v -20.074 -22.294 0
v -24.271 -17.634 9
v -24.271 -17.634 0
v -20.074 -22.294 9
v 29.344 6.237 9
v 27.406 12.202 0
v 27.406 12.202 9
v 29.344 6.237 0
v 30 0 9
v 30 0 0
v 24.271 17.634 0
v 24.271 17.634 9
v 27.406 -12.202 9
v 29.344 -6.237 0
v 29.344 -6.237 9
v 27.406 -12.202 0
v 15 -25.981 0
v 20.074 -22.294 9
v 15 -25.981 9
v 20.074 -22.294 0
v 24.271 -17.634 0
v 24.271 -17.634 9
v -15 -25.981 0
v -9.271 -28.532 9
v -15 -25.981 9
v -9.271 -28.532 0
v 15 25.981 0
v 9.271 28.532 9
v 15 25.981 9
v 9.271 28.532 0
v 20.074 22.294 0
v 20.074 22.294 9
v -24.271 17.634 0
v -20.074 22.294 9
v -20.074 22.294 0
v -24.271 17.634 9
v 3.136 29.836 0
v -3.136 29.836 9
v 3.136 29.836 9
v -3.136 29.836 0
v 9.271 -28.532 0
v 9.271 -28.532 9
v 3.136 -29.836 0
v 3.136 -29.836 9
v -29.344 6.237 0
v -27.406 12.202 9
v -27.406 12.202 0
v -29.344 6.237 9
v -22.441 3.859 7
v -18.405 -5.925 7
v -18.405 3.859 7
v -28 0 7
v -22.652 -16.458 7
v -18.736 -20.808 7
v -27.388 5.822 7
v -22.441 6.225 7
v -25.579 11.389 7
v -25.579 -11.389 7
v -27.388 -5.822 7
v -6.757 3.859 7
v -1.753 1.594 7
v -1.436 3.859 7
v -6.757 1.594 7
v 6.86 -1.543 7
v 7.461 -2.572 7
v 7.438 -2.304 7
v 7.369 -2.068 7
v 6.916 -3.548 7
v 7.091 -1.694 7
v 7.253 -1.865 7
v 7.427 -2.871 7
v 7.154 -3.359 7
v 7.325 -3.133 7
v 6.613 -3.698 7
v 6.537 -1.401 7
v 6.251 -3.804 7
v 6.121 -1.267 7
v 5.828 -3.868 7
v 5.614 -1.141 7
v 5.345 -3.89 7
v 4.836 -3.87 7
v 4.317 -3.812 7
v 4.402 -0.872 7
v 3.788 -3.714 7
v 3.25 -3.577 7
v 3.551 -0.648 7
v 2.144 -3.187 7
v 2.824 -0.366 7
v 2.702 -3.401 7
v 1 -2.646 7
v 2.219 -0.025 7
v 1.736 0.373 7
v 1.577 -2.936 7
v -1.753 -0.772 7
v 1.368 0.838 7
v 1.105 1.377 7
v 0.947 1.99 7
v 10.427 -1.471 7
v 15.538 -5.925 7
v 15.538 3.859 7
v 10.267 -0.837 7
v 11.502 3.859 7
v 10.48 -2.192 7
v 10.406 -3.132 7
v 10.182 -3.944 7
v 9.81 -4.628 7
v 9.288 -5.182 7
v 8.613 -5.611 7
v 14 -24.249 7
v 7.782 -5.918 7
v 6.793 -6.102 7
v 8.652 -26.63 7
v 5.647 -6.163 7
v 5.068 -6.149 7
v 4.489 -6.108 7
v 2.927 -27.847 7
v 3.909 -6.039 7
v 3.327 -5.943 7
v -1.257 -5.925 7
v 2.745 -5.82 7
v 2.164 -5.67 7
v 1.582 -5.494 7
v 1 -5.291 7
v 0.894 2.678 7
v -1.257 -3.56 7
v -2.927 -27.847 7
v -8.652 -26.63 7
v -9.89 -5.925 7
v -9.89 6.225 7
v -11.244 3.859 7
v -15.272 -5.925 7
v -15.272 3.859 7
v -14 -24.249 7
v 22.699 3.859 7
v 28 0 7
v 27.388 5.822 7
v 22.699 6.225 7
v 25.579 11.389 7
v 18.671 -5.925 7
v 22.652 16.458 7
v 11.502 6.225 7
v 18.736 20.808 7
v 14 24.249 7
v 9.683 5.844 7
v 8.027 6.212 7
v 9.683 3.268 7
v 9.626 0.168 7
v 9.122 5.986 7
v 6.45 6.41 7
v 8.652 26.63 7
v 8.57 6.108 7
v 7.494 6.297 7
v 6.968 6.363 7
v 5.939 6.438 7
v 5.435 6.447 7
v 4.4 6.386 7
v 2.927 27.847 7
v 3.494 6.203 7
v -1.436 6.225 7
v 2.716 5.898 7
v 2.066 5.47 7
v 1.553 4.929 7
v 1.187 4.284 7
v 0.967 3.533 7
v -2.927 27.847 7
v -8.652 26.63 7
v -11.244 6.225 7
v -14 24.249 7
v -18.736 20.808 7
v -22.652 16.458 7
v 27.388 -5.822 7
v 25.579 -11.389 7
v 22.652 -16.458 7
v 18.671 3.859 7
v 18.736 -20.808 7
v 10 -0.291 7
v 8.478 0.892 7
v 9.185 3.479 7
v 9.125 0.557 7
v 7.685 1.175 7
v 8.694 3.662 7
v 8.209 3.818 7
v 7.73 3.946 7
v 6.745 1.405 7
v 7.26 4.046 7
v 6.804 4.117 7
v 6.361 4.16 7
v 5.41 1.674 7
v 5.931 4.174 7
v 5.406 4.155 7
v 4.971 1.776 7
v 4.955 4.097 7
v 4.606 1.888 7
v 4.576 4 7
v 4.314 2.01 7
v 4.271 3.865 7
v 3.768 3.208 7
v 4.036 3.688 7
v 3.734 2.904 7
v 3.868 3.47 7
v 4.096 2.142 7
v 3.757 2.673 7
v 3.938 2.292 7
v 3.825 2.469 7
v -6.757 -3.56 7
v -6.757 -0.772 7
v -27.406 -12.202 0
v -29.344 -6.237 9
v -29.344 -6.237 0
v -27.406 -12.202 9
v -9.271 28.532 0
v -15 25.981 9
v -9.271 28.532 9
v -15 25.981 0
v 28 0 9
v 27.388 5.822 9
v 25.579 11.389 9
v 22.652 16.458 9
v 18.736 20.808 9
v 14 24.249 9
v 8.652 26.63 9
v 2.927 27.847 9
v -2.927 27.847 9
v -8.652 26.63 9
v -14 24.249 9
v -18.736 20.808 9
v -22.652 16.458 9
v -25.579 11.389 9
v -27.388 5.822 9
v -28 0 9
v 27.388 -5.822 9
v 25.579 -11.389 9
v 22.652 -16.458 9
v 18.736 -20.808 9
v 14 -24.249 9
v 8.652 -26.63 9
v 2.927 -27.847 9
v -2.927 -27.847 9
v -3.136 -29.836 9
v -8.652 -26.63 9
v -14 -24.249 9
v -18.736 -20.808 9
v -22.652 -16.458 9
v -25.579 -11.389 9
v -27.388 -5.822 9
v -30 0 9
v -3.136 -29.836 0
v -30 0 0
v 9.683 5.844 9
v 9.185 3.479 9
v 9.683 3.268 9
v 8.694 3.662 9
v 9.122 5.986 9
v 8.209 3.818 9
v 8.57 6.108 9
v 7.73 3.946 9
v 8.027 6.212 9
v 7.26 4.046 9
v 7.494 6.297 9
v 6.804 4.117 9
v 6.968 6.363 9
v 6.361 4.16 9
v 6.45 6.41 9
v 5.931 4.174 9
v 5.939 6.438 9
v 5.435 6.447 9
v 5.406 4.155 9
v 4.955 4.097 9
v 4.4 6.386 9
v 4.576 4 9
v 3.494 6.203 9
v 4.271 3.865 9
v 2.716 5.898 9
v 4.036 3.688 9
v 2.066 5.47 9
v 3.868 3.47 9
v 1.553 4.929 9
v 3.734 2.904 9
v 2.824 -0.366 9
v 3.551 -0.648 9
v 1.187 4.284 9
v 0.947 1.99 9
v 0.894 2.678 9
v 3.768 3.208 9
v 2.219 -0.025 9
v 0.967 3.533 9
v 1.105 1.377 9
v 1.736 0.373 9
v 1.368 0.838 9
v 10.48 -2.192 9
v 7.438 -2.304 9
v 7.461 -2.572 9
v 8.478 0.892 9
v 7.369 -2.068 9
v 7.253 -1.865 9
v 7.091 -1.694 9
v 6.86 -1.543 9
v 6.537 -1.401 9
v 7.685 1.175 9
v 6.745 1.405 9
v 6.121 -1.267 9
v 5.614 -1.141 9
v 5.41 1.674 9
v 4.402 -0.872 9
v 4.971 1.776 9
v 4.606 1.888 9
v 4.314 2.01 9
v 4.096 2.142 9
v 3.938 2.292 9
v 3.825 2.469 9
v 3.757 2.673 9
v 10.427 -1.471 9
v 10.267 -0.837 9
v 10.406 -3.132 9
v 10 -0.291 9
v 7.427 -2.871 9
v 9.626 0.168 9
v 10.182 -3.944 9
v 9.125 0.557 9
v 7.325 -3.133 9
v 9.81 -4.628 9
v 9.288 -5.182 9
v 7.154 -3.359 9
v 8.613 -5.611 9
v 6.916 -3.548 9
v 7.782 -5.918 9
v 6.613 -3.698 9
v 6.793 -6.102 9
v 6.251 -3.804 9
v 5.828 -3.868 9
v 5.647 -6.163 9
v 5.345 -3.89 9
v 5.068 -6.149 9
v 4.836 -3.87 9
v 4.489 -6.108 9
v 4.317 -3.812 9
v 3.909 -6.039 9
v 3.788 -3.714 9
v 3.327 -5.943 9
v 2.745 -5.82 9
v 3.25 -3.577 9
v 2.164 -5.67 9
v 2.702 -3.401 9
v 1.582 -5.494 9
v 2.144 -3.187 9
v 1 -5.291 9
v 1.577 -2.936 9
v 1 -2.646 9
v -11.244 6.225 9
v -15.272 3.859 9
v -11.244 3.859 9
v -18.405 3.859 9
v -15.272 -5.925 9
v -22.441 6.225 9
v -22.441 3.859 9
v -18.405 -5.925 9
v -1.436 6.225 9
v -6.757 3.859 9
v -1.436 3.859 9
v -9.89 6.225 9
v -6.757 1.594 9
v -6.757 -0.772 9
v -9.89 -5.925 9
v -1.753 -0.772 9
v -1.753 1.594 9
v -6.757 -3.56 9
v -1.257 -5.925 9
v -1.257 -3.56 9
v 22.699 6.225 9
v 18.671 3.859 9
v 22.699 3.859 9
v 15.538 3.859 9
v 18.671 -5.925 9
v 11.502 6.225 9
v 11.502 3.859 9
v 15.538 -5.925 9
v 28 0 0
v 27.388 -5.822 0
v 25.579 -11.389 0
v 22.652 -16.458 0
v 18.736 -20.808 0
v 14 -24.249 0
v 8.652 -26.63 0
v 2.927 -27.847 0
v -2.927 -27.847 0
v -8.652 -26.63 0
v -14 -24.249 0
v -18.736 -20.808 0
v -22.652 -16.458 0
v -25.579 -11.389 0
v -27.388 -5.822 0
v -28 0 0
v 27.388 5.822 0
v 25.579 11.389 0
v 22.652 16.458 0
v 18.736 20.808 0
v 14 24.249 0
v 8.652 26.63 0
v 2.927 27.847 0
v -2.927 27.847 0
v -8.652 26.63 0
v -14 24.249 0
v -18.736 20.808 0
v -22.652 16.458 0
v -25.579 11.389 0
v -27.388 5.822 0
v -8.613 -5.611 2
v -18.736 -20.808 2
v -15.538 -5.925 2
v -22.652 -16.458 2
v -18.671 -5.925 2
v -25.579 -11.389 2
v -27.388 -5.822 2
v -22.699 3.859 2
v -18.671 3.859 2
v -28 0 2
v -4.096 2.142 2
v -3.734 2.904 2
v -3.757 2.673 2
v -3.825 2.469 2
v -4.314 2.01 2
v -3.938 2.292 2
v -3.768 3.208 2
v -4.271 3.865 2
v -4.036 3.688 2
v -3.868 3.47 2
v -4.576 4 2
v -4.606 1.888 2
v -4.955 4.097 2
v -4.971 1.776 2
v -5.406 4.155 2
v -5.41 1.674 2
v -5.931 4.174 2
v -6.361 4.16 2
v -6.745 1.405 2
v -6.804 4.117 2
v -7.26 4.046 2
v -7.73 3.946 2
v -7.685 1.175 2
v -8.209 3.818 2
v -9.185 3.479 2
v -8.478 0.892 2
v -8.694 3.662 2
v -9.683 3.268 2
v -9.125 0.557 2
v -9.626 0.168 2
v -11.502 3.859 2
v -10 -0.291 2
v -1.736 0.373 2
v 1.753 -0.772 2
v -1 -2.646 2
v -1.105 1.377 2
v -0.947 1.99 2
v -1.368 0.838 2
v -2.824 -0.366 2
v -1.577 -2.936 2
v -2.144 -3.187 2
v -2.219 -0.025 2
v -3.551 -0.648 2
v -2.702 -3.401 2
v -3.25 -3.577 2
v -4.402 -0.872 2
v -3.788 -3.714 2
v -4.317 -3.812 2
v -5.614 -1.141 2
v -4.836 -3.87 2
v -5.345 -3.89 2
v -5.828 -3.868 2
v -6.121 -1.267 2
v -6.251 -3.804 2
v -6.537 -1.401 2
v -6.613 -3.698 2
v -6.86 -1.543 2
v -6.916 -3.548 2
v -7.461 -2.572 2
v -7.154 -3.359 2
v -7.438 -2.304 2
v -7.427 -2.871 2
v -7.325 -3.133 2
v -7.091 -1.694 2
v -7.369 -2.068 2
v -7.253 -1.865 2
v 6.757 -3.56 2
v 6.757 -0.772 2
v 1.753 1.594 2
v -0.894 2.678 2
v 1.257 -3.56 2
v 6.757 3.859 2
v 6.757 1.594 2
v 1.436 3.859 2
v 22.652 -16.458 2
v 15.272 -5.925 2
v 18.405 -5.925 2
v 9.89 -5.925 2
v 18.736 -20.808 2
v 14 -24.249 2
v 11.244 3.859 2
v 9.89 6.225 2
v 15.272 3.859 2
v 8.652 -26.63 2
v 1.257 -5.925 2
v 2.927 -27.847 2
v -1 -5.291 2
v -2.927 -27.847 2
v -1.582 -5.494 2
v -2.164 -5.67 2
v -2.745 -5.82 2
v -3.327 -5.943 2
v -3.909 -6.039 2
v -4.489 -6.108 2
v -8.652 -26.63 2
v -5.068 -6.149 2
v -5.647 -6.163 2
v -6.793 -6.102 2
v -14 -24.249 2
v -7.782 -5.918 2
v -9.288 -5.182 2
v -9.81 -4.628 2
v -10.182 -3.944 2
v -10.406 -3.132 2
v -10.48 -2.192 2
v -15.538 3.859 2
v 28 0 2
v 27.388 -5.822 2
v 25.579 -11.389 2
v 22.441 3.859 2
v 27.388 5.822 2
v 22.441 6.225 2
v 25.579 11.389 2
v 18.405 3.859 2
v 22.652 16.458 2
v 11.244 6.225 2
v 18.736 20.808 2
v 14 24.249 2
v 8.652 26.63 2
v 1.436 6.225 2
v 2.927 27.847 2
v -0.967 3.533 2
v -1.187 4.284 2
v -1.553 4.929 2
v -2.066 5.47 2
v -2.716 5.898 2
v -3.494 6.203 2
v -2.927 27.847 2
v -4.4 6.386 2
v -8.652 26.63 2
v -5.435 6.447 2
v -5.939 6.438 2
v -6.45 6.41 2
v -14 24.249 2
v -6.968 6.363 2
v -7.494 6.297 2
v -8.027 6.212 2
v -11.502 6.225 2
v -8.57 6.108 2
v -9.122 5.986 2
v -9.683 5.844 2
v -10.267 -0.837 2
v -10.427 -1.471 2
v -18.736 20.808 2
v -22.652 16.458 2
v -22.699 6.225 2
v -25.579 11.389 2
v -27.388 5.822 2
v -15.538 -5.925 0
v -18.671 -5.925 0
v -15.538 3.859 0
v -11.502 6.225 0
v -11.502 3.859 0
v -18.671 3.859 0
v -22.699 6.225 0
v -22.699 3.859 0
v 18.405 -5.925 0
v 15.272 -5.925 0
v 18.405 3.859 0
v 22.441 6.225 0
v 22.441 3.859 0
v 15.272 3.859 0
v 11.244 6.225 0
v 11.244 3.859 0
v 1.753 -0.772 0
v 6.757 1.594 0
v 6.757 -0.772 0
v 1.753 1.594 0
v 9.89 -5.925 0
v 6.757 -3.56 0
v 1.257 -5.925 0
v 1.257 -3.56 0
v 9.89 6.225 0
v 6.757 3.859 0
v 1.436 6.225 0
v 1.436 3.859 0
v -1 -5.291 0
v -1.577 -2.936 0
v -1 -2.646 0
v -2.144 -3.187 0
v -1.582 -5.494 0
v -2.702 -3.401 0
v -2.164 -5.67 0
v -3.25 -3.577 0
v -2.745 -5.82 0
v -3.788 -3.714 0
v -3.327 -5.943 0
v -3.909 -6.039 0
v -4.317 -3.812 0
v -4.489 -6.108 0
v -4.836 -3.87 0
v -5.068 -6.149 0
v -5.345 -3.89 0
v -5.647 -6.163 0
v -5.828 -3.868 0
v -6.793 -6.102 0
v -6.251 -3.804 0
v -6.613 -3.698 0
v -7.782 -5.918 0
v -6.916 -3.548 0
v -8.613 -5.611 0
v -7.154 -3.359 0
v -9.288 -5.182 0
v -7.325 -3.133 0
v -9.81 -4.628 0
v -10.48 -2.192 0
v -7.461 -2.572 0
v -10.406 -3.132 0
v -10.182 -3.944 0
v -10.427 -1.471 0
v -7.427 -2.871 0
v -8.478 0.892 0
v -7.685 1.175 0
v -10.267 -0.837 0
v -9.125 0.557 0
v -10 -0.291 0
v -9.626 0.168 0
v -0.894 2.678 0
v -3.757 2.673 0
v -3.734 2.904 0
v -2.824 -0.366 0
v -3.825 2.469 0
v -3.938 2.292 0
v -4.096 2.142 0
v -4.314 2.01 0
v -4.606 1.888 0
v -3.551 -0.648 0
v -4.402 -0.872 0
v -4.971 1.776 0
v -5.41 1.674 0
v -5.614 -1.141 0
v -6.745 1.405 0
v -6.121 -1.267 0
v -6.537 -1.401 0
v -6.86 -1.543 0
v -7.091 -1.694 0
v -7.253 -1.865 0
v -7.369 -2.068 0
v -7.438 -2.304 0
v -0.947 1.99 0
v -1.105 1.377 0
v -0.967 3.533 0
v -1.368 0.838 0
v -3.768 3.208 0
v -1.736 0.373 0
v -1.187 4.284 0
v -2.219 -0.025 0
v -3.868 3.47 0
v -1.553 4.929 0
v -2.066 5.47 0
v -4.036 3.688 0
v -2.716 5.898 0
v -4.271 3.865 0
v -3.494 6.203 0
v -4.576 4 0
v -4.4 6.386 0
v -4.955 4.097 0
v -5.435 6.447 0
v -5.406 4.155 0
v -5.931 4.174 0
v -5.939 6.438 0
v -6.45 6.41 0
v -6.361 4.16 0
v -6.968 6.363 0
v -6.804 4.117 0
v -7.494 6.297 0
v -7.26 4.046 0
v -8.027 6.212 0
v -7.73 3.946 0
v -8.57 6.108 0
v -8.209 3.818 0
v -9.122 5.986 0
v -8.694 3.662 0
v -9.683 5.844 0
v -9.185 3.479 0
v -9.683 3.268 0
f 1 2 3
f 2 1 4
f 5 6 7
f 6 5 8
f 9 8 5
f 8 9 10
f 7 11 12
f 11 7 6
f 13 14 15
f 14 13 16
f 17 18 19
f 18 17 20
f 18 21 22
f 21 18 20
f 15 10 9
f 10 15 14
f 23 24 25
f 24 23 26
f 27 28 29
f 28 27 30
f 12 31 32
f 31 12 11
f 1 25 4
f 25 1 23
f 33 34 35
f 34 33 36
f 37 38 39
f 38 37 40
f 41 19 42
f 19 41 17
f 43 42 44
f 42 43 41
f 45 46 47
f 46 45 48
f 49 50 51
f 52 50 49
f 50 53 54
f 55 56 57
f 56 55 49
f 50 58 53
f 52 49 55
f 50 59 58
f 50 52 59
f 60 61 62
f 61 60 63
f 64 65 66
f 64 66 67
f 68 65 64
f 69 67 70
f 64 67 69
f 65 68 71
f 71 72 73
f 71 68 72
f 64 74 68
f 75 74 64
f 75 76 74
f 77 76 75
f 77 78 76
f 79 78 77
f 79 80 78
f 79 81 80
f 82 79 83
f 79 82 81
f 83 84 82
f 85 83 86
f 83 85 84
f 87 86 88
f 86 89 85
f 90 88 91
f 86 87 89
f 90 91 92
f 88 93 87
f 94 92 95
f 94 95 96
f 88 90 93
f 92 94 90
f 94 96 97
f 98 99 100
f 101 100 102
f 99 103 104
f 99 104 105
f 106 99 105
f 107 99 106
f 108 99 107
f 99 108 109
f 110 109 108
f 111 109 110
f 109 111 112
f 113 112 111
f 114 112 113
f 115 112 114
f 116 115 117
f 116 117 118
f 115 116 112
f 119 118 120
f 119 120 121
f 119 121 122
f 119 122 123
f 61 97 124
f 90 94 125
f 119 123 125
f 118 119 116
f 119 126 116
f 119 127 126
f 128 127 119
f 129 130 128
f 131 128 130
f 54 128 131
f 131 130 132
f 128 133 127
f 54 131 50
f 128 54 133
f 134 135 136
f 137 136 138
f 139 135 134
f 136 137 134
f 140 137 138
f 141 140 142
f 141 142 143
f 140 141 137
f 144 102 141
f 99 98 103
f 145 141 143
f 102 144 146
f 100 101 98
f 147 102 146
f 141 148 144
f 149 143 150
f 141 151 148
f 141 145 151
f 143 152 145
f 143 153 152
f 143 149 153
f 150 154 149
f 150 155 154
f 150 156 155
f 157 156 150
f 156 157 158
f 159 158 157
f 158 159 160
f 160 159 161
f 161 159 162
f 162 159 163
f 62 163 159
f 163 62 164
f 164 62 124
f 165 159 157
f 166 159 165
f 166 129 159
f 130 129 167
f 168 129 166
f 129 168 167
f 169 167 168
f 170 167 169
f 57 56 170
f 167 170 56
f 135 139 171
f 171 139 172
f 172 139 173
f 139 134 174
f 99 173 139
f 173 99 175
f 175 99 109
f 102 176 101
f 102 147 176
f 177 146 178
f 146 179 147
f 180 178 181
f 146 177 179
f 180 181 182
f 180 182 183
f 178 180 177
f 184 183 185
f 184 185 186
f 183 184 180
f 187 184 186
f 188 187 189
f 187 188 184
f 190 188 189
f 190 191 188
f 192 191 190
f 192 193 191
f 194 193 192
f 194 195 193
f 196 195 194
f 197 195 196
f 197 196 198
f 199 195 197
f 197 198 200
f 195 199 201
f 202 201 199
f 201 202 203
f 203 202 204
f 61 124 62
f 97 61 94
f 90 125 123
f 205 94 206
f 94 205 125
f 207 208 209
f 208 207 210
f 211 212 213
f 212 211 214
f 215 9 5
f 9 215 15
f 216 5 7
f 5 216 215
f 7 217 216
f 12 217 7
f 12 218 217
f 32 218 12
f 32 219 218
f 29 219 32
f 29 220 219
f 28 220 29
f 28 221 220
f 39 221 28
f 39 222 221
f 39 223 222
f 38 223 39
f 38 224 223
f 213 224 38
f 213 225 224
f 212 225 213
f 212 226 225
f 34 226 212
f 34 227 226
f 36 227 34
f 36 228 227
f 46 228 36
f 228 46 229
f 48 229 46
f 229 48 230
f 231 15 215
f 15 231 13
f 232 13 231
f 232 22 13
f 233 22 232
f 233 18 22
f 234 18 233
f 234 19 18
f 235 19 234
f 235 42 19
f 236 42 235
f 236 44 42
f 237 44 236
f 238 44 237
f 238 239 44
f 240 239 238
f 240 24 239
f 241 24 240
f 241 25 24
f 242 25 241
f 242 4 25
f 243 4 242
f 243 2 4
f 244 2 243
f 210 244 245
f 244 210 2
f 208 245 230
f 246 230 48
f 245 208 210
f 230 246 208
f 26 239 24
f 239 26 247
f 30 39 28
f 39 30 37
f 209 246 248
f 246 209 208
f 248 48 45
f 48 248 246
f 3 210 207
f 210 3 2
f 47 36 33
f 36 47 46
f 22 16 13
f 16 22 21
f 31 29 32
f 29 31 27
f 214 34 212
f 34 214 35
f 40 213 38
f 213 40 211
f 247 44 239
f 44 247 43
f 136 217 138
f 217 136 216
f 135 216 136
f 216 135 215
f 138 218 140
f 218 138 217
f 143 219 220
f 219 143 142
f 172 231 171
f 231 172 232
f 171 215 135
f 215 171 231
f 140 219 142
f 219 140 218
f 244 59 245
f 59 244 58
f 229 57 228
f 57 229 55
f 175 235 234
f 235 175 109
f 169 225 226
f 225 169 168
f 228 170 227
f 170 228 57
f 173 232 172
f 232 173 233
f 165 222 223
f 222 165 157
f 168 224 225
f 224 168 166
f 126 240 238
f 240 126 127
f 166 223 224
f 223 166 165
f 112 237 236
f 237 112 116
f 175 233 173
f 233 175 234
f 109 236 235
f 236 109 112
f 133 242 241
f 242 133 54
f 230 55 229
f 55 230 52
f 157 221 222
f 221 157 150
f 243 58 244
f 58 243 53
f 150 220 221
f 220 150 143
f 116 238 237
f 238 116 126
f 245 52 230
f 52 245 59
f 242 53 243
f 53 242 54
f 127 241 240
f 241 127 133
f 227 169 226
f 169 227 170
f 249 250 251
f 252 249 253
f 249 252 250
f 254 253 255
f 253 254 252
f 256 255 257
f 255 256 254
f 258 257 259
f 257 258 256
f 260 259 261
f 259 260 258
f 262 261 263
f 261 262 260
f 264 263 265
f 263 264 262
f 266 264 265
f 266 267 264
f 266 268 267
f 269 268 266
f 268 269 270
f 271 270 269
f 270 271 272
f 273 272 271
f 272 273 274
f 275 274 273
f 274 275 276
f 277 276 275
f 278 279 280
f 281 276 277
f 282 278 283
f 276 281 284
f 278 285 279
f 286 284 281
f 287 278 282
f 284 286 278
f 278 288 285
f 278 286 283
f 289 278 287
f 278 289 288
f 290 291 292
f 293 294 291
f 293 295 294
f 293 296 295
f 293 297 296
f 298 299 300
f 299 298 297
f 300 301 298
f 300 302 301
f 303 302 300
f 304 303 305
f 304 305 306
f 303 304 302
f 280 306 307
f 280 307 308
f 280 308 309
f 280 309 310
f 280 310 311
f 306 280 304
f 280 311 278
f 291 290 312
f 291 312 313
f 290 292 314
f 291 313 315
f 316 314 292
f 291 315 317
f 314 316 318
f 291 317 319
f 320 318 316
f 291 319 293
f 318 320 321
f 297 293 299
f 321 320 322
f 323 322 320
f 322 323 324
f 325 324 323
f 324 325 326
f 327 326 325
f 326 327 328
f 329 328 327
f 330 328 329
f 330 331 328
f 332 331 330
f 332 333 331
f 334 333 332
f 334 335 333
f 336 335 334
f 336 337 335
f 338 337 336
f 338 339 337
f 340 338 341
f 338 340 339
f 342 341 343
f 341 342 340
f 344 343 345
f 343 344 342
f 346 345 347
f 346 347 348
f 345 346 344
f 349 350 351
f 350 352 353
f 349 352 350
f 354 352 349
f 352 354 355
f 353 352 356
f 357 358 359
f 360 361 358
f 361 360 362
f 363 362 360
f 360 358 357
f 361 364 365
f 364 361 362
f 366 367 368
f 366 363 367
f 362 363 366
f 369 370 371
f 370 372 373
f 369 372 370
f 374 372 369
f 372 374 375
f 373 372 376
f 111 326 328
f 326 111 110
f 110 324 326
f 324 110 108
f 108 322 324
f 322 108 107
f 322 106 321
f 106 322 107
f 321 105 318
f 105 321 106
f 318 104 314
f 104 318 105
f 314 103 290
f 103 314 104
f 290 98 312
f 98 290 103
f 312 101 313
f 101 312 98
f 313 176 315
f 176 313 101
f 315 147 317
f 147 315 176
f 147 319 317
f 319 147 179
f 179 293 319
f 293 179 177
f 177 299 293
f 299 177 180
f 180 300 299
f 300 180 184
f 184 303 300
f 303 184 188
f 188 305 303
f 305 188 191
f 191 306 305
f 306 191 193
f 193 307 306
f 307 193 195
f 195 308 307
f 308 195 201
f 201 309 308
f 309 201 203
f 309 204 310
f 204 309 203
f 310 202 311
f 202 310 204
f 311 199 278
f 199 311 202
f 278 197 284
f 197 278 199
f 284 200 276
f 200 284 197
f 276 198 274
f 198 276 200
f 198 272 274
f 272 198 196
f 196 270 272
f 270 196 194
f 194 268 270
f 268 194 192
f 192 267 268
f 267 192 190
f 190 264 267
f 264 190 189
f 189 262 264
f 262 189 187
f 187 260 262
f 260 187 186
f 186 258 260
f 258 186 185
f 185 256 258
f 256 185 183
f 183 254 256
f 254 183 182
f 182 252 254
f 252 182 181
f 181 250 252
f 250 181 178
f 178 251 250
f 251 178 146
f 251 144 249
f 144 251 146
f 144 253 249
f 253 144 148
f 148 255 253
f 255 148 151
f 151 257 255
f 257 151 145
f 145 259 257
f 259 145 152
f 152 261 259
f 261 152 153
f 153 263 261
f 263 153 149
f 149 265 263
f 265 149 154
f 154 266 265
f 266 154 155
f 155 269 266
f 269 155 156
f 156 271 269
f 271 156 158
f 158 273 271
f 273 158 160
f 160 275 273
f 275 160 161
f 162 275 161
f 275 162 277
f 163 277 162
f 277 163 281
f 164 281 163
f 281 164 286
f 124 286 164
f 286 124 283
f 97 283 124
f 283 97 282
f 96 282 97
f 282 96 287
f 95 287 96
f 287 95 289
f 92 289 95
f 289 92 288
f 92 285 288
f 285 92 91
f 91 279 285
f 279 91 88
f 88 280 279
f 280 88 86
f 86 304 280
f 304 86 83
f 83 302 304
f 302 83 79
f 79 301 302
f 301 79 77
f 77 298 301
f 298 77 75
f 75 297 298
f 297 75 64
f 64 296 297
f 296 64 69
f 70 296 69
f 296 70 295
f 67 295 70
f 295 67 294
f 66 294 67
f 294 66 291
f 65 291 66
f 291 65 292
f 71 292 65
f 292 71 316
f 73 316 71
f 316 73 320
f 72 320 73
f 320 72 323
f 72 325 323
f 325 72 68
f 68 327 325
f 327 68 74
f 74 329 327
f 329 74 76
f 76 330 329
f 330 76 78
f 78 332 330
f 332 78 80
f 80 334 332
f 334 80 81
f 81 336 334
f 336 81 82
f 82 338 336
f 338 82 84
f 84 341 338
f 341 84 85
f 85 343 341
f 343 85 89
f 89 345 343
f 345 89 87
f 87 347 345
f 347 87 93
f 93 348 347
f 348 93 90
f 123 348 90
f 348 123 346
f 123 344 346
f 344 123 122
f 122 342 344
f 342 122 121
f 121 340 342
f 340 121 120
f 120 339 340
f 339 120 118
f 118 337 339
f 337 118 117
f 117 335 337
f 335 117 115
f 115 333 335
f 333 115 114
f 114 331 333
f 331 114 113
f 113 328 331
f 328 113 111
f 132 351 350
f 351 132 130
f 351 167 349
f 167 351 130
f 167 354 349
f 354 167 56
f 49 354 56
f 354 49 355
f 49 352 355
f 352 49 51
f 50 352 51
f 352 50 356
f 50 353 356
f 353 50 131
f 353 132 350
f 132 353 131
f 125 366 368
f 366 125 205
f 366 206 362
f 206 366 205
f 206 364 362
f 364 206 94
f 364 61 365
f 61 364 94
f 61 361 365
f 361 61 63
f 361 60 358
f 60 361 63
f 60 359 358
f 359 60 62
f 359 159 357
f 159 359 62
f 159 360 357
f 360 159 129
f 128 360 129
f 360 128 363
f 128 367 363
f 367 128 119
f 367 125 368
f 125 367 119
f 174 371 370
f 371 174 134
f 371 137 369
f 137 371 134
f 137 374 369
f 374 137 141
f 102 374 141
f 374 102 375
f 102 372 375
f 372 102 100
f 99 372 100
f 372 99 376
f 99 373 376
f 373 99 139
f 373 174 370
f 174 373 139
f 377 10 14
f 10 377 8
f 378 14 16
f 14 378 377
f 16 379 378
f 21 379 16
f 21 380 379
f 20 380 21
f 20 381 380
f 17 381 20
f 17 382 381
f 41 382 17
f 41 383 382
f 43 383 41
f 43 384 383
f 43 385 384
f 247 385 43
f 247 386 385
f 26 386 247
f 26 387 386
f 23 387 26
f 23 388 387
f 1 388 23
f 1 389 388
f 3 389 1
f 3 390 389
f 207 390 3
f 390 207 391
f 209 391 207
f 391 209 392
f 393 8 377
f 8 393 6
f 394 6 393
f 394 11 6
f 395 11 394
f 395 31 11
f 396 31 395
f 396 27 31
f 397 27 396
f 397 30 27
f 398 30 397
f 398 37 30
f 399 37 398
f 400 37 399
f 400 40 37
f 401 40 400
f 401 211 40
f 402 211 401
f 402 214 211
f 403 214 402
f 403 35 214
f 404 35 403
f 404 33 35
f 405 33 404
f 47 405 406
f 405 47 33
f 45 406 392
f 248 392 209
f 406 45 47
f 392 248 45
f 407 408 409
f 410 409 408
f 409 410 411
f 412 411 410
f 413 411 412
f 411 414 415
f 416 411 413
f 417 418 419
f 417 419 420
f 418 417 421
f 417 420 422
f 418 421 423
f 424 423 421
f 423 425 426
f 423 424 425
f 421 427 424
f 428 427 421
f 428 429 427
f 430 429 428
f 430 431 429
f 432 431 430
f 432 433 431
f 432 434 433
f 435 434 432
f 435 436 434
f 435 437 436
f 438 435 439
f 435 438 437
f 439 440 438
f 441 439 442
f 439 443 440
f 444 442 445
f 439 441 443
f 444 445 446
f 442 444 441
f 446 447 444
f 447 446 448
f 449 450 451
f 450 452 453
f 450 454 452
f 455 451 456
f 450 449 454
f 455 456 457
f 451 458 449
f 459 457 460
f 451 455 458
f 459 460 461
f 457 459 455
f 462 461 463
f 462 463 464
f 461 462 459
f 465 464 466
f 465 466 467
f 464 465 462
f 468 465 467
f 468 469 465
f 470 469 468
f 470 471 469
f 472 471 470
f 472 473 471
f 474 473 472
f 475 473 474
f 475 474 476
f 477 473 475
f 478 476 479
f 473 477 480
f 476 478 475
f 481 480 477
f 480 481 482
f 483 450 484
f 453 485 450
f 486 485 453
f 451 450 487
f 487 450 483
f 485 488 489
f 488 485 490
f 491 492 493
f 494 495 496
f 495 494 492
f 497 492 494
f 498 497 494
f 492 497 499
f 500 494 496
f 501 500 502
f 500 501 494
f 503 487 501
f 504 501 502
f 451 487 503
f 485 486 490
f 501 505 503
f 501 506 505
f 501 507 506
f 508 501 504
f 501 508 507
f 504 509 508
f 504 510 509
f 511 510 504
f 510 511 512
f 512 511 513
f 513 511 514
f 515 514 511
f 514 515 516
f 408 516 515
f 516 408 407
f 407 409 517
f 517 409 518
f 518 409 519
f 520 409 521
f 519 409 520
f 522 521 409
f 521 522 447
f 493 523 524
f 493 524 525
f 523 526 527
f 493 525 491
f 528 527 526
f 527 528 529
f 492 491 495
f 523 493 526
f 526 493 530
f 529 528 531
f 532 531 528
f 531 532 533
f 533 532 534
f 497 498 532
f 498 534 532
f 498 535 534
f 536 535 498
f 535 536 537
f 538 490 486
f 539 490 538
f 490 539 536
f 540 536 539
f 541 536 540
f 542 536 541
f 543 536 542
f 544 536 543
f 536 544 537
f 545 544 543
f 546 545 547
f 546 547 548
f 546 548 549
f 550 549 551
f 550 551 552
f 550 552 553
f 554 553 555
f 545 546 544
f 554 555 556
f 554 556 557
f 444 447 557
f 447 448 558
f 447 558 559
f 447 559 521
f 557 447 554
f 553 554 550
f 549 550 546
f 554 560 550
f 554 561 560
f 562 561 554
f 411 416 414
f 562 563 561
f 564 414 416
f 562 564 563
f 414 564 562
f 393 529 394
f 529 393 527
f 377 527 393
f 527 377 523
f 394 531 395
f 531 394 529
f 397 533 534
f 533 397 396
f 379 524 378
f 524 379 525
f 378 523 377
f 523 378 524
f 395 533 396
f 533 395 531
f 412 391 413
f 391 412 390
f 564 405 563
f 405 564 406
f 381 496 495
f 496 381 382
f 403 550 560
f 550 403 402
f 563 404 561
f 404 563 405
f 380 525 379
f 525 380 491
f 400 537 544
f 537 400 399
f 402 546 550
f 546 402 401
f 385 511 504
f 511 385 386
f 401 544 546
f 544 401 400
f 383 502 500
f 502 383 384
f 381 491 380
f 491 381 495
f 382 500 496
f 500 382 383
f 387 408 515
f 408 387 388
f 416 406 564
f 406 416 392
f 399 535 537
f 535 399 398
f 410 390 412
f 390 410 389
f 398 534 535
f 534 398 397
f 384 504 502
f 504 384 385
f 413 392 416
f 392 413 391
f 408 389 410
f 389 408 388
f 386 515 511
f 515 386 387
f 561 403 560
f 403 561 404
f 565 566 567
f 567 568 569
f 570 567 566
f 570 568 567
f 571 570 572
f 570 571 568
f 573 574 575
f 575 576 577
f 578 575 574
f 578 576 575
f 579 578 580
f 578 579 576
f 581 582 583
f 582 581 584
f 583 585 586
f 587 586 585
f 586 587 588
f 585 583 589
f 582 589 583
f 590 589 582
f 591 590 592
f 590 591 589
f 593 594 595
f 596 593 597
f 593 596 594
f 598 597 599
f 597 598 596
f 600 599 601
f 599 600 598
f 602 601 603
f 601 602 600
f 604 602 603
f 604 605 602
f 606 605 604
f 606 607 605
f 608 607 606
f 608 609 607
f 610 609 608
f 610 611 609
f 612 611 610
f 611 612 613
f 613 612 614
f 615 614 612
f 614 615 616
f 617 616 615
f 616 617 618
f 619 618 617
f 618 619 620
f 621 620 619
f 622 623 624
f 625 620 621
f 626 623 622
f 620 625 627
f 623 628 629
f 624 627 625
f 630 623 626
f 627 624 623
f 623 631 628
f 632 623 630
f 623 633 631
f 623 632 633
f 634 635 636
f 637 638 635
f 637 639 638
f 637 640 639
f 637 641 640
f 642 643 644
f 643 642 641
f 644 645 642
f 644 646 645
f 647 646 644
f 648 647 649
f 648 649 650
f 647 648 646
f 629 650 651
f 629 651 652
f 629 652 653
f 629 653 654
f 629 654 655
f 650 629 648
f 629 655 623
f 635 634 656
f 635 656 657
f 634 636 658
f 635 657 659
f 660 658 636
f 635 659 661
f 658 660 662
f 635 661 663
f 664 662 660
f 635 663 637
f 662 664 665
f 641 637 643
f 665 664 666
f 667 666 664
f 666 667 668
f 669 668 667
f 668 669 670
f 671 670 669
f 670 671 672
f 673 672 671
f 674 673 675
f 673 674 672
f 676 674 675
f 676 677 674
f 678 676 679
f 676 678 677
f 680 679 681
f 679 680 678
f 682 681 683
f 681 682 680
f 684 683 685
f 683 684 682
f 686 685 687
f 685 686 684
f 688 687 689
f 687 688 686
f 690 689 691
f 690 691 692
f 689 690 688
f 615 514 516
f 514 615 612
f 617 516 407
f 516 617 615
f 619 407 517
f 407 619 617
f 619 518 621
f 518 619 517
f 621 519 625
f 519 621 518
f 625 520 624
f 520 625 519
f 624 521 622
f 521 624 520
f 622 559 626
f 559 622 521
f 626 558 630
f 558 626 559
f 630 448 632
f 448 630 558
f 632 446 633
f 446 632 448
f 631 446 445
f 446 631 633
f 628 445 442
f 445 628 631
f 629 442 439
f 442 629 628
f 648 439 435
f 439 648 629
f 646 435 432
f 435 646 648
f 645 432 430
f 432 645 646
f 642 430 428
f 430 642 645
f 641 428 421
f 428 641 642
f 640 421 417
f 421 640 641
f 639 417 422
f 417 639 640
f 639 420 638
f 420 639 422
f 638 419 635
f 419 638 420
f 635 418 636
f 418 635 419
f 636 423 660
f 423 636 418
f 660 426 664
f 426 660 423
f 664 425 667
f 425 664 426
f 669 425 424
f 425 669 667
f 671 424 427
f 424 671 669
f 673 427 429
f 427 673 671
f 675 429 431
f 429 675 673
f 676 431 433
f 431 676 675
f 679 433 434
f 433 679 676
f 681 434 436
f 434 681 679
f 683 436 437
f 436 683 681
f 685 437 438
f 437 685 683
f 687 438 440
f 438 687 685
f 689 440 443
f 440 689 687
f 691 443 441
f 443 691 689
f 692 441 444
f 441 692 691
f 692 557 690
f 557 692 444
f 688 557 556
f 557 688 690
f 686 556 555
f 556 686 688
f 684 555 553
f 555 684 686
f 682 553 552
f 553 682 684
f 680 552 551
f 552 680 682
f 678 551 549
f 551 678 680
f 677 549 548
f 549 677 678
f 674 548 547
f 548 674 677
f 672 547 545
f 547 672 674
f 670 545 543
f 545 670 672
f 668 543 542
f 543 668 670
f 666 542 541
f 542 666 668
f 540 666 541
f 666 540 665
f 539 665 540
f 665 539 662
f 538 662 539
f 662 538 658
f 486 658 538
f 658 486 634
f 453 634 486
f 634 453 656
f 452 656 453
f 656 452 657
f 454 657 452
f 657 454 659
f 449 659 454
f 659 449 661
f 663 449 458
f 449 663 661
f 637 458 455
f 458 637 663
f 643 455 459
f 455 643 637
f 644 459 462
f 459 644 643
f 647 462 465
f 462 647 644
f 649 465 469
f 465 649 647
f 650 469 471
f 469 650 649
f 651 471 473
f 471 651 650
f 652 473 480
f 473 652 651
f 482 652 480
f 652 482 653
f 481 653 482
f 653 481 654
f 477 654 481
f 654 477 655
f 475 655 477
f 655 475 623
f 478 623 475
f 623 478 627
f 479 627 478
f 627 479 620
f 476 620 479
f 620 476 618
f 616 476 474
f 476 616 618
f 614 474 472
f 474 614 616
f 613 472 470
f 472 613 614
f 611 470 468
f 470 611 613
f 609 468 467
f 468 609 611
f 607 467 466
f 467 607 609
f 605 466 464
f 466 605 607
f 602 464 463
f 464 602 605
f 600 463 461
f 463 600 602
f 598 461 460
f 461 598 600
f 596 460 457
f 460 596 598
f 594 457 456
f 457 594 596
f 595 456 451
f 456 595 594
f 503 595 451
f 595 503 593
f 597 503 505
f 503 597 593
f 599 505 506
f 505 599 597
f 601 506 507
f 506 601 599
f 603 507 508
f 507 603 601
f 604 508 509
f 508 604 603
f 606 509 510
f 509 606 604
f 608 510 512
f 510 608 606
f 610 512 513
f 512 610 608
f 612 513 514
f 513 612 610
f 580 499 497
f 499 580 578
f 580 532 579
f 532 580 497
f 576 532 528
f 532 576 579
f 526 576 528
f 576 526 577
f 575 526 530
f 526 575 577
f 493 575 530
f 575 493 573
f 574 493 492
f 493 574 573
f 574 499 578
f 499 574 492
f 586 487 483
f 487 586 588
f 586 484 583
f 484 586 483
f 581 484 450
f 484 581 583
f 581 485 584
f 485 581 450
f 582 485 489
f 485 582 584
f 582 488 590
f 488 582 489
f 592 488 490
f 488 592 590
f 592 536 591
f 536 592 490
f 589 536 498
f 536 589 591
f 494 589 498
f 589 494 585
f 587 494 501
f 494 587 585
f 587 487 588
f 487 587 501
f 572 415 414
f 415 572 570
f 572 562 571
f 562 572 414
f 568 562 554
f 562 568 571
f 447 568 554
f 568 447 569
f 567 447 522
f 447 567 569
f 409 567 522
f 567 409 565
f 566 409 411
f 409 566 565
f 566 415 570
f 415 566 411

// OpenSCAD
module structure
(
    radius,
    structureHeight
)
{
    cylinder
    (
        structureHeight,
        radius,
        radius,
        center = false
    );
}

module bothSurfaceDetails
(
    message,
    positiveText,
    structureHeight,
    detailHeight,
    rimThickness,
    radius,
    textSize
)
{
    //Top
    singleSurfaceDetail
    (
        ZPosition  =  structureHeight,
        positiveText = positiveText,
        message = message,
        detailHeight = detailHeight,
        rimThickness = rimThickness,
        radius = radius,
        textSize = textSize,
        flipped = false
    );

    //Bottom
    singleSurfaceDetail
    (
        ZPosition  =  - detailHeight,
        positiveText = positiveText,
        message = message,
        detailHeight = detailHeight,
        rimThickness = rimThickness,
        radius = radius,
        textSize = textSize,
        flipped = true
    );
}

module rim
(
    position,
    removeInterior,
    detailHeight,
    radius,
    rimThickness
)
{
    difference()
    {
        translate
        (
            position
        )
        {
            cylinder
            (
                detailHeight,
                radius,
                radius,
                center = false
            );
        }

        if(removeInterior)
        {
            translate
            (
                position
            )
            {
                cylinder
                (
                    detailHeight + 1,
                    radius - rimThickness,
                    radius - rimThickness,
                    center = false
                );
            }
        }
    }
}

module textFlipper
(
    position,
    string,
    detailHeight,
    textSize,
    needsFlipping = false
)
{
    if(needsFlipping)
    {
        mirror
        (
            [
                1,
                0,
                0
            ]
        )
        {
            3dtext
            (
                position = position,
                string = string,
                detailHeight = detailHeight,
                textSize = textSize
            );
        }
    }
    else
    {
        3dtext
        (
            position = position,
            string = string,
            detailHeight = detailHeight,
            textSize = textSize
        );
    }
}

module singleSurfaceDetail
(
    ZPosition,
    positiveText,
    message,
    detailHeight,
    rimThickness,
    radius,
    textSize,
    flipped = false
)
{
    position = 
    [
        0,
        0,
        ZPosition
    ];
    if(positiveText)
    {
        rim
        (
            position = position,
            removeInterior = true,
            detailHeight = detailHeight,
            radius = radius,
            rimThickness = rimThickness
        );
        textFlipper
        (
            position = position,
            string = message,
            detailHeight = detailHeight,
            needsFlipping = flipped,
            textSize = textSize
        );
    }
    else
    {
        difference()
        {
            rim
            (
                position = position,
                removeInterior = false,
                detailHeight = detailHeight,
                radius = radius,
                rimThickness = rimThickness
            );
            textFlipper
            (
                position = position,
                string = message,
                detailHeight = detailHeight,
                needsFlipping = flipped,
                textSize = textSize
            );
        }
    }
}

module 3dtext
(
    position,
    string,
    detailHeight,
    textSize
)
{
    translate
    (
        position
    )
    {
        linear_extrude(detailHeight)
        {
            text
            (
                text = string,
                size = textSize,
                font = "Liberation:style=Bold",
                valign = "center",
                halign = "center"
            );
        }
    }
}

module coin
(
    message = "TEST",
    positiveText = true,
    topSurfaceOnly = false,
    radius = 30,
    structureHeight = 5,
    detailHeight = 2,
    rimThickness = 2,
    textSize = 12
)
{
    translate
    (
        [
            0,
            0,
            detailHeight
        ]
    )
    {
        structure
        (
            radius = radius,
            structureHeight = structureHeight
        );

        if(topSurfaceOnly)
        {
            singleSurfaceDetail
            (
                ZPosition = structureHeight,
                positiveText = positiveText,
                message = message,
                detailHeight = detailHeight,
                rimThickness = rimThickness,
                radius = radius,
                textSize = textSize,
                flipped = false
            );
        }
        else
        {
            bothSurfaceDetails
            (
                message = message,
                positiveText = positiveText,
                structureHeight = structureHeight,
                detailHeight = detailHeight,
                rimThickness = rimThickness,
                radius = radius,
                textSize = textSize
            );
        }
    }
}

coin();
